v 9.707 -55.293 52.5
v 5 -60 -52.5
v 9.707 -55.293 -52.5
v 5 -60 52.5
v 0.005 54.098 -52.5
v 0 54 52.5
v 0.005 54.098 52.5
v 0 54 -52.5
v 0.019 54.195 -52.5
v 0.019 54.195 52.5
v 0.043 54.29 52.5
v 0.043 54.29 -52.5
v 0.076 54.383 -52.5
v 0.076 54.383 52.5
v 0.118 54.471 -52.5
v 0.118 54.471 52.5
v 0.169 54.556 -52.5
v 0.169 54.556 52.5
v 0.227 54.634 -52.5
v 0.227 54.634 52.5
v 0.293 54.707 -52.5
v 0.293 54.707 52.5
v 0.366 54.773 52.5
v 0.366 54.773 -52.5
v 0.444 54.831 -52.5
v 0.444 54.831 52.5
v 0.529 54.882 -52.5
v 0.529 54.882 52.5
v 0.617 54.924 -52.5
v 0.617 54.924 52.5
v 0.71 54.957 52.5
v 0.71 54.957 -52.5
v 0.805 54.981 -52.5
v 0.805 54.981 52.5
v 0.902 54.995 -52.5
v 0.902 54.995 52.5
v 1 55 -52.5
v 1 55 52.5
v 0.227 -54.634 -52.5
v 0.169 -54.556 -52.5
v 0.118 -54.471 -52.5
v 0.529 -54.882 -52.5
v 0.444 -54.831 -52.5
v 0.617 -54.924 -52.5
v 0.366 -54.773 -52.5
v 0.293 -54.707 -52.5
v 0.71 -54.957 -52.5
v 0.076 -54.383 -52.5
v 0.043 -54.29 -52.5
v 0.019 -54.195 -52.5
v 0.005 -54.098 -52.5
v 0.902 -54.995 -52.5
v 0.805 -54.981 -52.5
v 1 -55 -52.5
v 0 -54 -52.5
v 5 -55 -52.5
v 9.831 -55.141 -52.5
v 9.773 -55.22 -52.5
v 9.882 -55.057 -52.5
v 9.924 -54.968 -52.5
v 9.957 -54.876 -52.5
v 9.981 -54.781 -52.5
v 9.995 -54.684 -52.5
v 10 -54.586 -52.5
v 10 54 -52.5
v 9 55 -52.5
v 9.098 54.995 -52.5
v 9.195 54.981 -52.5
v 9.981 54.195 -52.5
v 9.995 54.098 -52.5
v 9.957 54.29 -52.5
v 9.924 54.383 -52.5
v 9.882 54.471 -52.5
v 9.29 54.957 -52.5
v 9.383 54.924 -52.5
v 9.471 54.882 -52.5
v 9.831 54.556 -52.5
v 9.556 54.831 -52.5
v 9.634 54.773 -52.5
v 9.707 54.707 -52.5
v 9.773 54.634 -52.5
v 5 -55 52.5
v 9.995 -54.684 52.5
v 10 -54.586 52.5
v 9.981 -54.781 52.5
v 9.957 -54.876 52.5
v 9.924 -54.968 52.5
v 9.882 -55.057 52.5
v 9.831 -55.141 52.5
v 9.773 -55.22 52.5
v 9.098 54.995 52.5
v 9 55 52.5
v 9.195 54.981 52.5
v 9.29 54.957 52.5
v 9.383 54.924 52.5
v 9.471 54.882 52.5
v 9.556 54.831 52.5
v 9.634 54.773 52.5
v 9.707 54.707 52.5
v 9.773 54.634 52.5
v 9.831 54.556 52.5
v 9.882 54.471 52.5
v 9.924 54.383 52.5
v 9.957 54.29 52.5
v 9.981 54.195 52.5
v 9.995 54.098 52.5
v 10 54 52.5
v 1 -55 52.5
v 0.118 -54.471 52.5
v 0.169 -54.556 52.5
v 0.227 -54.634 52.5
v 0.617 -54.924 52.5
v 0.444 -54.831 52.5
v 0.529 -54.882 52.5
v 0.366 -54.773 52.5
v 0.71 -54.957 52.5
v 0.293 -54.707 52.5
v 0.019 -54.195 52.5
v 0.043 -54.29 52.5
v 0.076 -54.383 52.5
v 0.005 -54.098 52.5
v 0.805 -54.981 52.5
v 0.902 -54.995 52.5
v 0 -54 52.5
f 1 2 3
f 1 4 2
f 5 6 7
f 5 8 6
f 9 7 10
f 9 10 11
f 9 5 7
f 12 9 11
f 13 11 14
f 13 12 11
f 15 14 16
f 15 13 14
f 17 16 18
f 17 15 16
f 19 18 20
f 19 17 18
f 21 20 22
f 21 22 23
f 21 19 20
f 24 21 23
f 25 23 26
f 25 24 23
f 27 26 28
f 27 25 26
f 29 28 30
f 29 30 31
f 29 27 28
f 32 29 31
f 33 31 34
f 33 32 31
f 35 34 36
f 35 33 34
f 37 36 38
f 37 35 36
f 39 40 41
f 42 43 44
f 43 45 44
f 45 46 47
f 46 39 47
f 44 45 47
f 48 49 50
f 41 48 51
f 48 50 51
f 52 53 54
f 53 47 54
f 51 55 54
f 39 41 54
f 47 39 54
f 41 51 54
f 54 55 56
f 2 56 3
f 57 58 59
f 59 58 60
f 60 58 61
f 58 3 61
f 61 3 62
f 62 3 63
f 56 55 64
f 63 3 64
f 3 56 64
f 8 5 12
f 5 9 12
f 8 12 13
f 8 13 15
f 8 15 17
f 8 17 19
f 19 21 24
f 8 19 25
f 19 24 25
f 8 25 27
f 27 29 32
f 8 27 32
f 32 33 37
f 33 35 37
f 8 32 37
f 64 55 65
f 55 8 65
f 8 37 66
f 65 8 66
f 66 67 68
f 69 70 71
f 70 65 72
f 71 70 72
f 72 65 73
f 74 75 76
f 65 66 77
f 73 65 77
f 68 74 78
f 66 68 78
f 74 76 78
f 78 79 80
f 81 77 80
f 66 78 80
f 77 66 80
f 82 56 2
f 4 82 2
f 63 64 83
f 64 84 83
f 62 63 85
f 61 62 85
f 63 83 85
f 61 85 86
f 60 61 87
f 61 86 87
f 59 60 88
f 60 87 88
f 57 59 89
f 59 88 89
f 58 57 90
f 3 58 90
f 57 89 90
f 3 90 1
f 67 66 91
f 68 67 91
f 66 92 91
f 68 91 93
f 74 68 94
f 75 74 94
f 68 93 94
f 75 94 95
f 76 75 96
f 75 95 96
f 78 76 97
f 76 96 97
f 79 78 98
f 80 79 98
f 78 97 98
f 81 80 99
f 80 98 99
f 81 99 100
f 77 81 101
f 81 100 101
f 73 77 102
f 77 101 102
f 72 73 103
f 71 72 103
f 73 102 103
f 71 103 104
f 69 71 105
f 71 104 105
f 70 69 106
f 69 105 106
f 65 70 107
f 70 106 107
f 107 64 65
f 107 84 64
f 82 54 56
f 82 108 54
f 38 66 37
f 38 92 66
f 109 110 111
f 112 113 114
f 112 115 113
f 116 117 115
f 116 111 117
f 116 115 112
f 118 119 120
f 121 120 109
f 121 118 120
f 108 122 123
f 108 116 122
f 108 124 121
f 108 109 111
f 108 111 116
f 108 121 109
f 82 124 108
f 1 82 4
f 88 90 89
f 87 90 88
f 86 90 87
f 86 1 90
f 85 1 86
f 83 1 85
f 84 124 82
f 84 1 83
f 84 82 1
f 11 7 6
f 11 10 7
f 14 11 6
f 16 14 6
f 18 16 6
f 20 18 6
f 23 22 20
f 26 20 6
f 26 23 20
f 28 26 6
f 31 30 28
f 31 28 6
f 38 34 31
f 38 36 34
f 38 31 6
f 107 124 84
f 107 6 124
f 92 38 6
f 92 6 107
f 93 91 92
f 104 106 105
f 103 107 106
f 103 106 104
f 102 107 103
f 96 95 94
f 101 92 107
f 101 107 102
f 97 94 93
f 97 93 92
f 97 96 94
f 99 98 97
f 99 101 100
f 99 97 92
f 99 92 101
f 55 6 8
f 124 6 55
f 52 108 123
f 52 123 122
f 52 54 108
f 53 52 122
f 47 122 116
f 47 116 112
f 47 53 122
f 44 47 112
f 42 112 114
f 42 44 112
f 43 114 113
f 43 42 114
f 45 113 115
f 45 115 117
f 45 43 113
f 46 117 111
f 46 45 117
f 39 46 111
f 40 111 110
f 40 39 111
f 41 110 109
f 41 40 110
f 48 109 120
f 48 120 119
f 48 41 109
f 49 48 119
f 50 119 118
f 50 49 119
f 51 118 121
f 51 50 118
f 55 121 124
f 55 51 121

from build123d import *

# Parameters (mm, degrees)
BOSS_EXTRUDE1_DEPTH = 52.5
FILLET1_R           = 1


with BuildPart() as part:
    # Sketch1 → Boss-Extrude1 (new, symmetric)
    with BuildSketch(Plane.XY):
        Polygon((5, -55), (5, -60), (10, -55), (10, 55), (0, 55), (0, -55), align=None)
    extrude(amount=BOSS_EXTRUDE1_DEPTH, both=True)

    # Fillet1
    fillet1_edges = [part.edges().sort_by_distance(p)[0] for p in [
        (10, -55, 0),
        (0, -55, 0),
        (0, 55, 0),
        (10, 55, 0),
    ]]
    fillet(fillet1_edges, radius=FILLET1_R)


solid = part.part
